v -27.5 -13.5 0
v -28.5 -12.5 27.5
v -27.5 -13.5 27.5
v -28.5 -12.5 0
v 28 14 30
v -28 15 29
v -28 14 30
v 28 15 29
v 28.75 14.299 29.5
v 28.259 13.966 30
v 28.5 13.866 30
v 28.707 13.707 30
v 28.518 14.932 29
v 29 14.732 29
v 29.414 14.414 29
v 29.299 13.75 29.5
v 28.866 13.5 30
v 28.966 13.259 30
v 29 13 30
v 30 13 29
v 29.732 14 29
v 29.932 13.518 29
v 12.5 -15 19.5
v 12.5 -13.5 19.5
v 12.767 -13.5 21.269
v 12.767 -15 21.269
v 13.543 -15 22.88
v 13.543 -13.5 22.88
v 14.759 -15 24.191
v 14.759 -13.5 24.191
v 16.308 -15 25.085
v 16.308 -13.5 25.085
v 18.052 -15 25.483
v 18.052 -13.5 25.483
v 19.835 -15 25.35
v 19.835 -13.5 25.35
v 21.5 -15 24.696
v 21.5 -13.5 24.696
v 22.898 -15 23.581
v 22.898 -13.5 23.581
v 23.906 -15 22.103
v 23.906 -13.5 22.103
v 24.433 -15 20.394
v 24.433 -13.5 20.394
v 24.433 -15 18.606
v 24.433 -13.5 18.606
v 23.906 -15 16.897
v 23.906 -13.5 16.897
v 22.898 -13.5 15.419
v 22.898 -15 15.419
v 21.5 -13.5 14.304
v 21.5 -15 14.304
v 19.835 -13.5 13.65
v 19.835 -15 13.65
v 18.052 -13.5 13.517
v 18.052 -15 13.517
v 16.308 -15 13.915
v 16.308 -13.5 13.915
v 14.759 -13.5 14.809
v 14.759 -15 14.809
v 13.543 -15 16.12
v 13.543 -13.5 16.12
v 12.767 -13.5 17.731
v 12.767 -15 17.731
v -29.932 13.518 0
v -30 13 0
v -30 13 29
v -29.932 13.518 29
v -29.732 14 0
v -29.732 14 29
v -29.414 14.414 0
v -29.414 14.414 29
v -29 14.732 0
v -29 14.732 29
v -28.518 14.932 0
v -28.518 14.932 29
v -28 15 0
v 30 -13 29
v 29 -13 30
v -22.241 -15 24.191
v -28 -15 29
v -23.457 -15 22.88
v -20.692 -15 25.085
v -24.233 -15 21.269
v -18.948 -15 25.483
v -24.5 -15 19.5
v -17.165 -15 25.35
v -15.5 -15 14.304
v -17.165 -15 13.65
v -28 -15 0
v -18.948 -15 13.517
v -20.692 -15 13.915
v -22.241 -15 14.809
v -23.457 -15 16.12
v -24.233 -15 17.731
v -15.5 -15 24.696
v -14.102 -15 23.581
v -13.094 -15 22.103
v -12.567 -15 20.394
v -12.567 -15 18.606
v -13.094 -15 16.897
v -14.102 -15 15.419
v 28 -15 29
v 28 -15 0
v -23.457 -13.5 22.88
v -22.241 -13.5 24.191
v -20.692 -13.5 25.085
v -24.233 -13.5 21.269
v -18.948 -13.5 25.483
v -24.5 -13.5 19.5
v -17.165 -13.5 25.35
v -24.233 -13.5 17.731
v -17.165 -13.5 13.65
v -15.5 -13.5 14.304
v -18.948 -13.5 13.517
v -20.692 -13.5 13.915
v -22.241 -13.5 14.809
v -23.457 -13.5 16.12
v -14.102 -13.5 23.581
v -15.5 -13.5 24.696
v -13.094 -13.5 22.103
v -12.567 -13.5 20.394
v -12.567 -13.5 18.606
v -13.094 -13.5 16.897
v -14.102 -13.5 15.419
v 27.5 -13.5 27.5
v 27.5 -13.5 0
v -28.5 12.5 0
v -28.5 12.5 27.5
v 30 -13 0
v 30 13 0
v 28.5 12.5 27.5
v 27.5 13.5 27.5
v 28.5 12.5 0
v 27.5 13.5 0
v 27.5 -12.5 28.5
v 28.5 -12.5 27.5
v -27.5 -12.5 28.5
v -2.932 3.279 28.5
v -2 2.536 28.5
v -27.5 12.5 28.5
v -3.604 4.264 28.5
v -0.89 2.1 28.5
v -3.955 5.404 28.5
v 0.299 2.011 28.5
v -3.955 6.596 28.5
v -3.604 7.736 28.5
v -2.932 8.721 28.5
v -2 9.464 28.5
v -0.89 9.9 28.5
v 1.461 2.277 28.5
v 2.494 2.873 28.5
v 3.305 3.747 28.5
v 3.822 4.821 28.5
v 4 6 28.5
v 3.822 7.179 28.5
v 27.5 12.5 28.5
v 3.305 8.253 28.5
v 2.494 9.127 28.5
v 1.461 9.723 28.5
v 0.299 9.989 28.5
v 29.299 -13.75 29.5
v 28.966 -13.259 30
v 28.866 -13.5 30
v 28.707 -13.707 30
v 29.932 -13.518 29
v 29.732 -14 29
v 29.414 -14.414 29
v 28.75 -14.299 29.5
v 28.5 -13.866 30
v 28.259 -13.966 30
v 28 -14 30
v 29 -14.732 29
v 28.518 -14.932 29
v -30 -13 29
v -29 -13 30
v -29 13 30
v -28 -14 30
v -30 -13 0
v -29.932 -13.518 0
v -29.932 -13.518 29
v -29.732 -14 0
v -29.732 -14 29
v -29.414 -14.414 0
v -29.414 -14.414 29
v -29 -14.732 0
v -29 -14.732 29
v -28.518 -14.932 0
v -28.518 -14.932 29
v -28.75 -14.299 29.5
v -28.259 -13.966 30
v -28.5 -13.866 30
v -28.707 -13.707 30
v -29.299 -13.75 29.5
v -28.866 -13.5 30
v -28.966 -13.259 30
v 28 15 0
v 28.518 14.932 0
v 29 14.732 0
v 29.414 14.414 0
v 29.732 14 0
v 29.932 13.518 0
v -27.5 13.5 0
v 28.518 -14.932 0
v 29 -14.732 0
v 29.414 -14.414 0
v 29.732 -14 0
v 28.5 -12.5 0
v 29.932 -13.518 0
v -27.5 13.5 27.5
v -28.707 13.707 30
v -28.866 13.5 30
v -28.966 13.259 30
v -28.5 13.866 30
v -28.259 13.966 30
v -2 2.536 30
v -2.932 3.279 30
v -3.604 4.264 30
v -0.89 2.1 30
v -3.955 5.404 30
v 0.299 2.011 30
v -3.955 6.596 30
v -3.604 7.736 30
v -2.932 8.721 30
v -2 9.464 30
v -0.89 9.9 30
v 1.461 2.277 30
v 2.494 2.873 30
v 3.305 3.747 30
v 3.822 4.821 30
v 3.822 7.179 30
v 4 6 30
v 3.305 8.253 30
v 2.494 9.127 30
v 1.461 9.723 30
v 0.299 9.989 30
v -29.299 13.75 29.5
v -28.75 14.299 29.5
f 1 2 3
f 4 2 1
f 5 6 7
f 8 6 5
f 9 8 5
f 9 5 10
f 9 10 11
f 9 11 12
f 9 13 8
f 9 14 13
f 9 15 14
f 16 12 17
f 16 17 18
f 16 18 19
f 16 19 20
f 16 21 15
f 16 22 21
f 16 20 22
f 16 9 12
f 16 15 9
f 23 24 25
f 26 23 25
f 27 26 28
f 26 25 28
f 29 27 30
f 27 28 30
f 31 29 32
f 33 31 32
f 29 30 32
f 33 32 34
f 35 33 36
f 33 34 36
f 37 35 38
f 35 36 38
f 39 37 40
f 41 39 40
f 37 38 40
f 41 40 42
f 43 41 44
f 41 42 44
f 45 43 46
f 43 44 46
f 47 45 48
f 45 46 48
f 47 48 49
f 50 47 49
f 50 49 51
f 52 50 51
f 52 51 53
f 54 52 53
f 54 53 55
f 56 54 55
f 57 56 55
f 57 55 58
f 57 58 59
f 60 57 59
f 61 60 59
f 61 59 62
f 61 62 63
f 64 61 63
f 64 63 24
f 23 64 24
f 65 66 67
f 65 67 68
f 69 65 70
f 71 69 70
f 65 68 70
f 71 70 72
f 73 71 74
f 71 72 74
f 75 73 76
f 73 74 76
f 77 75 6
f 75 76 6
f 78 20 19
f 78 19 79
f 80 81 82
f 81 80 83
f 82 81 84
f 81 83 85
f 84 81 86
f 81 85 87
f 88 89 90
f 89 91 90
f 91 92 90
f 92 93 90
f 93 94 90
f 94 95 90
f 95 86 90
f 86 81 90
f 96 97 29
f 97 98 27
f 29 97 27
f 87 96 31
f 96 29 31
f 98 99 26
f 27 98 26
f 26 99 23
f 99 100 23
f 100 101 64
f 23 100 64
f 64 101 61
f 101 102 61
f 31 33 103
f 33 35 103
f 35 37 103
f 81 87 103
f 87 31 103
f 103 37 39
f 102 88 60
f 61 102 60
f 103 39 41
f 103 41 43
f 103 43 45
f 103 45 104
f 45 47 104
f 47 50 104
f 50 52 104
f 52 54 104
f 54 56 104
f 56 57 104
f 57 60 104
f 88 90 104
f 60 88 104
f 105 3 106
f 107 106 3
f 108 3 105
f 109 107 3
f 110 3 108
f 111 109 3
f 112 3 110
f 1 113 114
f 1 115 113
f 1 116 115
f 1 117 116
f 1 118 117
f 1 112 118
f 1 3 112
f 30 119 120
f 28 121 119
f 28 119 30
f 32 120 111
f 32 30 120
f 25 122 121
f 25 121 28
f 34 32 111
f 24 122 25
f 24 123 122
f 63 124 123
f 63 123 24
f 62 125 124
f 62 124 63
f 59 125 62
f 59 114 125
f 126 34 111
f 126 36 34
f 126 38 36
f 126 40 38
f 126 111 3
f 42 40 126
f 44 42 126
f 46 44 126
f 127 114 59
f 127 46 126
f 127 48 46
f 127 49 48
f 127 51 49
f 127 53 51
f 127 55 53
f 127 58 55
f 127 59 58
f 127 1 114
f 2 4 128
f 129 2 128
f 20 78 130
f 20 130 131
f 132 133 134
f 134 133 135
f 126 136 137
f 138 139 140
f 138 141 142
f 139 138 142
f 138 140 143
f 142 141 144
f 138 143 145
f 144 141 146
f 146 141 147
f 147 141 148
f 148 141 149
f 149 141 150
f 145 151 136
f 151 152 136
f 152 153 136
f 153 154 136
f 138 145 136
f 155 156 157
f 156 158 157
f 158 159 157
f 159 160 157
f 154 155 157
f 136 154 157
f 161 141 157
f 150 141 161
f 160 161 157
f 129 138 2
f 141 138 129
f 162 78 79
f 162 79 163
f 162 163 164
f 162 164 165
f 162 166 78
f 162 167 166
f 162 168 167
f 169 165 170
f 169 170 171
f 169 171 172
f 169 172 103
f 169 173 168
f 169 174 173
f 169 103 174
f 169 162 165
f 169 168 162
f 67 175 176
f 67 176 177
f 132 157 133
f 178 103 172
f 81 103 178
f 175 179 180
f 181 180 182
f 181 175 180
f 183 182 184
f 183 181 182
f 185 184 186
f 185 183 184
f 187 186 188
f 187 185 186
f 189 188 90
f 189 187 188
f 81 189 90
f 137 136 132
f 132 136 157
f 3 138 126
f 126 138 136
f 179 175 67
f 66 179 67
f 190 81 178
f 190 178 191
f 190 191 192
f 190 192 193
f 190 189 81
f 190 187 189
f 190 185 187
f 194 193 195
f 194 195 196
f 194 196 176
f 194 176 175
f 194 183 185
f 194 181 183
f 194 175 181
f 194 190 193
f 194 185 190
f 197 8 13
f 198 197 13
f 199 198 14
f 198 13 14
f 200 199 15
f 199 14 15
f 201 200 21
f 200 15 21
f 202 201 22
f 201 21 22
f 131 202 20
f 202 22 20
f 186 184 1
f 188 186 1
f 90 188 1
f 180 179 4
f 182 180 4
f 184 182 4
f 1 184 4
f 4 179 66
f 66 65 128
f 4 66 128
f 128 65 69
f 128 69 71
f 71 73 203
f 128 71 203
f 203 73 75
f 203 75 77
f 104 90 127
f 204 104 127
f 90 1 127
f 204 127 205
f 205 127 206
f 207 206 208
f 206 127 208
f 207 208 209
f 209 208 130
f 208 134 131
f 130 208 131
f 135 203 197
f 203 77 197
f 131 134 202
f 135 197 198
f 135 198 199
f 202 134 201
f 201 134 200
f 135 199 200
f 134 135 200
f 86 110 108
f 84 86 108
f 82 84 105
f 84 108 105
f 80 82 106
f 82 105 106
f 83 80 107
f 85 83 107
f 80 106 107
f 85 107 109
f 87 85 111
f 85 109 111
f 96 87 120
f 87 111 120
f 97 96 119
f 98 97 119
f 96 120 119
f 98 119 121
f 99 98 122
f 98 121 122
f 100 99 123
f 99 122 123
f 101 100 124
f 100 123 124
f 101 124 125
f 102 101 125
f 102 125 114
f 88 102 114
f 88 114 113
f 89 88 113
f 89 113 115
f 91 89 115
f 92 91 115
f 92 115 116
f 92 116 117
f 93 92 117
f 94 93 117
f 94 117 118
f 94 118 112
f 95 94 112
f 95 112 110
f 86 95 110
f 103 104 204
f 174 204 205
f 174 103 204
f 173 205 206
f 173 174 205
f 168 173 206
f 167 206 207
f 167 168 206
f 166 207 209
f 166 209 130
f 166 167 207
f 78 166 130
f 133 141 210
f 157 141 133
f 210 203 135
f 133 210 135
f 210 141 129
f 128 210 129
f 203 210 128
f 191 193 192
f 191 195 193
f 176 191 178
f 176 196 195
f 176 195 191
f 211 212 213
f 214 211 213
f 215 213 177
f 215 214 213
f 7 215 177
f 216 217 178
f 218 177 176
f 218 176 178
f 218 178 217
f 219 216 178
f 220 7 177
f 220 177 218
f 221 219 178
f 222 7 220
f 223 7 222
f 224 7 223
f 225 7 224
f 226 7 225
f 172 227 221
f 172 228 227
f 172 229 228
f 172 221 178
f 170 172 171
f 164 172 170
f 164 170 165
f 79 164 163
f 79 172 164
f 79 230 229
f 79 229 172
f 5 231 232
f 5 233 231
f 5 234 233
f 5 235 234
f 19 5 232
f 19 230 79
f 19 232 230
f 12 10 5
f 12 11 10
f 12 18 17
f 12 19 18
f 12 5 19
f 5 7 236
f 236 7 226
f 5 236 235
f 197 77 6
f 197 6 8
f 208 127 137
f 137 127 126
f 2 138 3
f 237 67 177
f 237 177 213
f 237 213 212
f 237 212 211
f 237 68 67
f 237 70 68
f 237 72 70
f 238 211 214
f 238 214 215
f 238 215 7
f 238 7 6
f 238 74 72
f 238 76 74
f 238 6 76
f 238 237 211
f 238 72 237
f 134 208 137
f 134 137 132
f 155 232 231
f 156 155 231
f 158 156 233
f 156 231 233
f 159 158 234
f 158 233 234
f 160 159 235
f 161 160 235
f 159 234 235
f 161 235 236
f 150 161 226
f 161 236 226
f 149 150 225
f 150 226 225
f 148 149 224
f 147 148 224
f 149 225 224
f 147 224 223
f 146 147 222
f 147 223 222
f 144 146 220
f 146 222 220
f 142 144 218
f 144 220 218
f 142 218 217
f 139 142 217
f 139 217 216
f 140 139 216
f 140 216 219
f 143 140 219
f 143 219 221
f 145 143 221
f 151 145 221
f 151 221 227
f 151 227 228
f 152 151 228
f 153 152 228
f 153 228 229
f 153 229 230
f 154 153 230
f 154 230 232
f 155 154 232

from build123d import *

# Parameters (mm, degrees)
F0_W     = 60
F0_H     = 30
F1_DEPTH = 30
F2_T     = -1.5
F3_R     = 6
F4_DEPTH = 1.501
F5_R     = 4
F6_DEPTH = 30.001
F7_R     = 2
F8_SIZE  = 1


with BuildPart() as f1:
    # F0 (on Top) → F1 (new body)
    with BuildSketch(Plane.XY):
        Rectangle(F0_W, F0_H)
    extrude(amount=F1_DEPTH)

    # F2
    f2_openings = [f1.faces().sort_by_distance(p)[0] for p in [
        (0, 0, 0),
    ]]
    offset(amount=F2_T, openings=f2_openings)

    # F3 (on face) → F4 (cut, through all)
    with BuildSketch(Plane(origin=(0, -13.5, 0), x_dir=(-1, 0, 0), z_dir=(0, 1, 0))):
        with Locations((-18.5, 19.5)):
            Circle(F3_R)
        with Locations((18.5, 19.5)):
            Circle(F3_R)
    extrude(amount=-F4_DEPTH, mode=Mode.SUBTRACT)

    # F5 (on face) → F6 (cut, through all)
    with BuildSketch(Plane.XY.offset(30)):
        with Locations((0, 6)):
            Circle(F5_R)
    extrude(amount=-F6_DEPTH, mode=Mode.SUBTRACT)

    # F7
    f7_edges = [f1.edges().sort_by_distance(p)[0] for p in [
        (30, 15, 15),
        (30, -15, 15),
        (-30, -15, 15),
        (-30, 15, 15),
    ]]
    fillet(f7_edges, radius=F7_R)

    # F8
    f8_edges = [f1.edges().sort_by_distance(p)[0] for p in [
        (28.5, 0, 28.5),
        (0, 13.5, 28.5),
        (0, -13.5, 28.5),
        (-28.5, 0, 28.5),
        (28.5, -13.5, 14.25),
        (28.5, 13.5, 14.25),
        (-28.5, -13.5, 14.25),
        (-28.5, 13.5, 14.25),
        (0, 15, 30),
        (30, 0, 30),
        (-30, 0, 30),
        (0, -15, 30),
    ]]
    chamfer(f8_edges, length=F8_SIZE)


solid = f1.part
